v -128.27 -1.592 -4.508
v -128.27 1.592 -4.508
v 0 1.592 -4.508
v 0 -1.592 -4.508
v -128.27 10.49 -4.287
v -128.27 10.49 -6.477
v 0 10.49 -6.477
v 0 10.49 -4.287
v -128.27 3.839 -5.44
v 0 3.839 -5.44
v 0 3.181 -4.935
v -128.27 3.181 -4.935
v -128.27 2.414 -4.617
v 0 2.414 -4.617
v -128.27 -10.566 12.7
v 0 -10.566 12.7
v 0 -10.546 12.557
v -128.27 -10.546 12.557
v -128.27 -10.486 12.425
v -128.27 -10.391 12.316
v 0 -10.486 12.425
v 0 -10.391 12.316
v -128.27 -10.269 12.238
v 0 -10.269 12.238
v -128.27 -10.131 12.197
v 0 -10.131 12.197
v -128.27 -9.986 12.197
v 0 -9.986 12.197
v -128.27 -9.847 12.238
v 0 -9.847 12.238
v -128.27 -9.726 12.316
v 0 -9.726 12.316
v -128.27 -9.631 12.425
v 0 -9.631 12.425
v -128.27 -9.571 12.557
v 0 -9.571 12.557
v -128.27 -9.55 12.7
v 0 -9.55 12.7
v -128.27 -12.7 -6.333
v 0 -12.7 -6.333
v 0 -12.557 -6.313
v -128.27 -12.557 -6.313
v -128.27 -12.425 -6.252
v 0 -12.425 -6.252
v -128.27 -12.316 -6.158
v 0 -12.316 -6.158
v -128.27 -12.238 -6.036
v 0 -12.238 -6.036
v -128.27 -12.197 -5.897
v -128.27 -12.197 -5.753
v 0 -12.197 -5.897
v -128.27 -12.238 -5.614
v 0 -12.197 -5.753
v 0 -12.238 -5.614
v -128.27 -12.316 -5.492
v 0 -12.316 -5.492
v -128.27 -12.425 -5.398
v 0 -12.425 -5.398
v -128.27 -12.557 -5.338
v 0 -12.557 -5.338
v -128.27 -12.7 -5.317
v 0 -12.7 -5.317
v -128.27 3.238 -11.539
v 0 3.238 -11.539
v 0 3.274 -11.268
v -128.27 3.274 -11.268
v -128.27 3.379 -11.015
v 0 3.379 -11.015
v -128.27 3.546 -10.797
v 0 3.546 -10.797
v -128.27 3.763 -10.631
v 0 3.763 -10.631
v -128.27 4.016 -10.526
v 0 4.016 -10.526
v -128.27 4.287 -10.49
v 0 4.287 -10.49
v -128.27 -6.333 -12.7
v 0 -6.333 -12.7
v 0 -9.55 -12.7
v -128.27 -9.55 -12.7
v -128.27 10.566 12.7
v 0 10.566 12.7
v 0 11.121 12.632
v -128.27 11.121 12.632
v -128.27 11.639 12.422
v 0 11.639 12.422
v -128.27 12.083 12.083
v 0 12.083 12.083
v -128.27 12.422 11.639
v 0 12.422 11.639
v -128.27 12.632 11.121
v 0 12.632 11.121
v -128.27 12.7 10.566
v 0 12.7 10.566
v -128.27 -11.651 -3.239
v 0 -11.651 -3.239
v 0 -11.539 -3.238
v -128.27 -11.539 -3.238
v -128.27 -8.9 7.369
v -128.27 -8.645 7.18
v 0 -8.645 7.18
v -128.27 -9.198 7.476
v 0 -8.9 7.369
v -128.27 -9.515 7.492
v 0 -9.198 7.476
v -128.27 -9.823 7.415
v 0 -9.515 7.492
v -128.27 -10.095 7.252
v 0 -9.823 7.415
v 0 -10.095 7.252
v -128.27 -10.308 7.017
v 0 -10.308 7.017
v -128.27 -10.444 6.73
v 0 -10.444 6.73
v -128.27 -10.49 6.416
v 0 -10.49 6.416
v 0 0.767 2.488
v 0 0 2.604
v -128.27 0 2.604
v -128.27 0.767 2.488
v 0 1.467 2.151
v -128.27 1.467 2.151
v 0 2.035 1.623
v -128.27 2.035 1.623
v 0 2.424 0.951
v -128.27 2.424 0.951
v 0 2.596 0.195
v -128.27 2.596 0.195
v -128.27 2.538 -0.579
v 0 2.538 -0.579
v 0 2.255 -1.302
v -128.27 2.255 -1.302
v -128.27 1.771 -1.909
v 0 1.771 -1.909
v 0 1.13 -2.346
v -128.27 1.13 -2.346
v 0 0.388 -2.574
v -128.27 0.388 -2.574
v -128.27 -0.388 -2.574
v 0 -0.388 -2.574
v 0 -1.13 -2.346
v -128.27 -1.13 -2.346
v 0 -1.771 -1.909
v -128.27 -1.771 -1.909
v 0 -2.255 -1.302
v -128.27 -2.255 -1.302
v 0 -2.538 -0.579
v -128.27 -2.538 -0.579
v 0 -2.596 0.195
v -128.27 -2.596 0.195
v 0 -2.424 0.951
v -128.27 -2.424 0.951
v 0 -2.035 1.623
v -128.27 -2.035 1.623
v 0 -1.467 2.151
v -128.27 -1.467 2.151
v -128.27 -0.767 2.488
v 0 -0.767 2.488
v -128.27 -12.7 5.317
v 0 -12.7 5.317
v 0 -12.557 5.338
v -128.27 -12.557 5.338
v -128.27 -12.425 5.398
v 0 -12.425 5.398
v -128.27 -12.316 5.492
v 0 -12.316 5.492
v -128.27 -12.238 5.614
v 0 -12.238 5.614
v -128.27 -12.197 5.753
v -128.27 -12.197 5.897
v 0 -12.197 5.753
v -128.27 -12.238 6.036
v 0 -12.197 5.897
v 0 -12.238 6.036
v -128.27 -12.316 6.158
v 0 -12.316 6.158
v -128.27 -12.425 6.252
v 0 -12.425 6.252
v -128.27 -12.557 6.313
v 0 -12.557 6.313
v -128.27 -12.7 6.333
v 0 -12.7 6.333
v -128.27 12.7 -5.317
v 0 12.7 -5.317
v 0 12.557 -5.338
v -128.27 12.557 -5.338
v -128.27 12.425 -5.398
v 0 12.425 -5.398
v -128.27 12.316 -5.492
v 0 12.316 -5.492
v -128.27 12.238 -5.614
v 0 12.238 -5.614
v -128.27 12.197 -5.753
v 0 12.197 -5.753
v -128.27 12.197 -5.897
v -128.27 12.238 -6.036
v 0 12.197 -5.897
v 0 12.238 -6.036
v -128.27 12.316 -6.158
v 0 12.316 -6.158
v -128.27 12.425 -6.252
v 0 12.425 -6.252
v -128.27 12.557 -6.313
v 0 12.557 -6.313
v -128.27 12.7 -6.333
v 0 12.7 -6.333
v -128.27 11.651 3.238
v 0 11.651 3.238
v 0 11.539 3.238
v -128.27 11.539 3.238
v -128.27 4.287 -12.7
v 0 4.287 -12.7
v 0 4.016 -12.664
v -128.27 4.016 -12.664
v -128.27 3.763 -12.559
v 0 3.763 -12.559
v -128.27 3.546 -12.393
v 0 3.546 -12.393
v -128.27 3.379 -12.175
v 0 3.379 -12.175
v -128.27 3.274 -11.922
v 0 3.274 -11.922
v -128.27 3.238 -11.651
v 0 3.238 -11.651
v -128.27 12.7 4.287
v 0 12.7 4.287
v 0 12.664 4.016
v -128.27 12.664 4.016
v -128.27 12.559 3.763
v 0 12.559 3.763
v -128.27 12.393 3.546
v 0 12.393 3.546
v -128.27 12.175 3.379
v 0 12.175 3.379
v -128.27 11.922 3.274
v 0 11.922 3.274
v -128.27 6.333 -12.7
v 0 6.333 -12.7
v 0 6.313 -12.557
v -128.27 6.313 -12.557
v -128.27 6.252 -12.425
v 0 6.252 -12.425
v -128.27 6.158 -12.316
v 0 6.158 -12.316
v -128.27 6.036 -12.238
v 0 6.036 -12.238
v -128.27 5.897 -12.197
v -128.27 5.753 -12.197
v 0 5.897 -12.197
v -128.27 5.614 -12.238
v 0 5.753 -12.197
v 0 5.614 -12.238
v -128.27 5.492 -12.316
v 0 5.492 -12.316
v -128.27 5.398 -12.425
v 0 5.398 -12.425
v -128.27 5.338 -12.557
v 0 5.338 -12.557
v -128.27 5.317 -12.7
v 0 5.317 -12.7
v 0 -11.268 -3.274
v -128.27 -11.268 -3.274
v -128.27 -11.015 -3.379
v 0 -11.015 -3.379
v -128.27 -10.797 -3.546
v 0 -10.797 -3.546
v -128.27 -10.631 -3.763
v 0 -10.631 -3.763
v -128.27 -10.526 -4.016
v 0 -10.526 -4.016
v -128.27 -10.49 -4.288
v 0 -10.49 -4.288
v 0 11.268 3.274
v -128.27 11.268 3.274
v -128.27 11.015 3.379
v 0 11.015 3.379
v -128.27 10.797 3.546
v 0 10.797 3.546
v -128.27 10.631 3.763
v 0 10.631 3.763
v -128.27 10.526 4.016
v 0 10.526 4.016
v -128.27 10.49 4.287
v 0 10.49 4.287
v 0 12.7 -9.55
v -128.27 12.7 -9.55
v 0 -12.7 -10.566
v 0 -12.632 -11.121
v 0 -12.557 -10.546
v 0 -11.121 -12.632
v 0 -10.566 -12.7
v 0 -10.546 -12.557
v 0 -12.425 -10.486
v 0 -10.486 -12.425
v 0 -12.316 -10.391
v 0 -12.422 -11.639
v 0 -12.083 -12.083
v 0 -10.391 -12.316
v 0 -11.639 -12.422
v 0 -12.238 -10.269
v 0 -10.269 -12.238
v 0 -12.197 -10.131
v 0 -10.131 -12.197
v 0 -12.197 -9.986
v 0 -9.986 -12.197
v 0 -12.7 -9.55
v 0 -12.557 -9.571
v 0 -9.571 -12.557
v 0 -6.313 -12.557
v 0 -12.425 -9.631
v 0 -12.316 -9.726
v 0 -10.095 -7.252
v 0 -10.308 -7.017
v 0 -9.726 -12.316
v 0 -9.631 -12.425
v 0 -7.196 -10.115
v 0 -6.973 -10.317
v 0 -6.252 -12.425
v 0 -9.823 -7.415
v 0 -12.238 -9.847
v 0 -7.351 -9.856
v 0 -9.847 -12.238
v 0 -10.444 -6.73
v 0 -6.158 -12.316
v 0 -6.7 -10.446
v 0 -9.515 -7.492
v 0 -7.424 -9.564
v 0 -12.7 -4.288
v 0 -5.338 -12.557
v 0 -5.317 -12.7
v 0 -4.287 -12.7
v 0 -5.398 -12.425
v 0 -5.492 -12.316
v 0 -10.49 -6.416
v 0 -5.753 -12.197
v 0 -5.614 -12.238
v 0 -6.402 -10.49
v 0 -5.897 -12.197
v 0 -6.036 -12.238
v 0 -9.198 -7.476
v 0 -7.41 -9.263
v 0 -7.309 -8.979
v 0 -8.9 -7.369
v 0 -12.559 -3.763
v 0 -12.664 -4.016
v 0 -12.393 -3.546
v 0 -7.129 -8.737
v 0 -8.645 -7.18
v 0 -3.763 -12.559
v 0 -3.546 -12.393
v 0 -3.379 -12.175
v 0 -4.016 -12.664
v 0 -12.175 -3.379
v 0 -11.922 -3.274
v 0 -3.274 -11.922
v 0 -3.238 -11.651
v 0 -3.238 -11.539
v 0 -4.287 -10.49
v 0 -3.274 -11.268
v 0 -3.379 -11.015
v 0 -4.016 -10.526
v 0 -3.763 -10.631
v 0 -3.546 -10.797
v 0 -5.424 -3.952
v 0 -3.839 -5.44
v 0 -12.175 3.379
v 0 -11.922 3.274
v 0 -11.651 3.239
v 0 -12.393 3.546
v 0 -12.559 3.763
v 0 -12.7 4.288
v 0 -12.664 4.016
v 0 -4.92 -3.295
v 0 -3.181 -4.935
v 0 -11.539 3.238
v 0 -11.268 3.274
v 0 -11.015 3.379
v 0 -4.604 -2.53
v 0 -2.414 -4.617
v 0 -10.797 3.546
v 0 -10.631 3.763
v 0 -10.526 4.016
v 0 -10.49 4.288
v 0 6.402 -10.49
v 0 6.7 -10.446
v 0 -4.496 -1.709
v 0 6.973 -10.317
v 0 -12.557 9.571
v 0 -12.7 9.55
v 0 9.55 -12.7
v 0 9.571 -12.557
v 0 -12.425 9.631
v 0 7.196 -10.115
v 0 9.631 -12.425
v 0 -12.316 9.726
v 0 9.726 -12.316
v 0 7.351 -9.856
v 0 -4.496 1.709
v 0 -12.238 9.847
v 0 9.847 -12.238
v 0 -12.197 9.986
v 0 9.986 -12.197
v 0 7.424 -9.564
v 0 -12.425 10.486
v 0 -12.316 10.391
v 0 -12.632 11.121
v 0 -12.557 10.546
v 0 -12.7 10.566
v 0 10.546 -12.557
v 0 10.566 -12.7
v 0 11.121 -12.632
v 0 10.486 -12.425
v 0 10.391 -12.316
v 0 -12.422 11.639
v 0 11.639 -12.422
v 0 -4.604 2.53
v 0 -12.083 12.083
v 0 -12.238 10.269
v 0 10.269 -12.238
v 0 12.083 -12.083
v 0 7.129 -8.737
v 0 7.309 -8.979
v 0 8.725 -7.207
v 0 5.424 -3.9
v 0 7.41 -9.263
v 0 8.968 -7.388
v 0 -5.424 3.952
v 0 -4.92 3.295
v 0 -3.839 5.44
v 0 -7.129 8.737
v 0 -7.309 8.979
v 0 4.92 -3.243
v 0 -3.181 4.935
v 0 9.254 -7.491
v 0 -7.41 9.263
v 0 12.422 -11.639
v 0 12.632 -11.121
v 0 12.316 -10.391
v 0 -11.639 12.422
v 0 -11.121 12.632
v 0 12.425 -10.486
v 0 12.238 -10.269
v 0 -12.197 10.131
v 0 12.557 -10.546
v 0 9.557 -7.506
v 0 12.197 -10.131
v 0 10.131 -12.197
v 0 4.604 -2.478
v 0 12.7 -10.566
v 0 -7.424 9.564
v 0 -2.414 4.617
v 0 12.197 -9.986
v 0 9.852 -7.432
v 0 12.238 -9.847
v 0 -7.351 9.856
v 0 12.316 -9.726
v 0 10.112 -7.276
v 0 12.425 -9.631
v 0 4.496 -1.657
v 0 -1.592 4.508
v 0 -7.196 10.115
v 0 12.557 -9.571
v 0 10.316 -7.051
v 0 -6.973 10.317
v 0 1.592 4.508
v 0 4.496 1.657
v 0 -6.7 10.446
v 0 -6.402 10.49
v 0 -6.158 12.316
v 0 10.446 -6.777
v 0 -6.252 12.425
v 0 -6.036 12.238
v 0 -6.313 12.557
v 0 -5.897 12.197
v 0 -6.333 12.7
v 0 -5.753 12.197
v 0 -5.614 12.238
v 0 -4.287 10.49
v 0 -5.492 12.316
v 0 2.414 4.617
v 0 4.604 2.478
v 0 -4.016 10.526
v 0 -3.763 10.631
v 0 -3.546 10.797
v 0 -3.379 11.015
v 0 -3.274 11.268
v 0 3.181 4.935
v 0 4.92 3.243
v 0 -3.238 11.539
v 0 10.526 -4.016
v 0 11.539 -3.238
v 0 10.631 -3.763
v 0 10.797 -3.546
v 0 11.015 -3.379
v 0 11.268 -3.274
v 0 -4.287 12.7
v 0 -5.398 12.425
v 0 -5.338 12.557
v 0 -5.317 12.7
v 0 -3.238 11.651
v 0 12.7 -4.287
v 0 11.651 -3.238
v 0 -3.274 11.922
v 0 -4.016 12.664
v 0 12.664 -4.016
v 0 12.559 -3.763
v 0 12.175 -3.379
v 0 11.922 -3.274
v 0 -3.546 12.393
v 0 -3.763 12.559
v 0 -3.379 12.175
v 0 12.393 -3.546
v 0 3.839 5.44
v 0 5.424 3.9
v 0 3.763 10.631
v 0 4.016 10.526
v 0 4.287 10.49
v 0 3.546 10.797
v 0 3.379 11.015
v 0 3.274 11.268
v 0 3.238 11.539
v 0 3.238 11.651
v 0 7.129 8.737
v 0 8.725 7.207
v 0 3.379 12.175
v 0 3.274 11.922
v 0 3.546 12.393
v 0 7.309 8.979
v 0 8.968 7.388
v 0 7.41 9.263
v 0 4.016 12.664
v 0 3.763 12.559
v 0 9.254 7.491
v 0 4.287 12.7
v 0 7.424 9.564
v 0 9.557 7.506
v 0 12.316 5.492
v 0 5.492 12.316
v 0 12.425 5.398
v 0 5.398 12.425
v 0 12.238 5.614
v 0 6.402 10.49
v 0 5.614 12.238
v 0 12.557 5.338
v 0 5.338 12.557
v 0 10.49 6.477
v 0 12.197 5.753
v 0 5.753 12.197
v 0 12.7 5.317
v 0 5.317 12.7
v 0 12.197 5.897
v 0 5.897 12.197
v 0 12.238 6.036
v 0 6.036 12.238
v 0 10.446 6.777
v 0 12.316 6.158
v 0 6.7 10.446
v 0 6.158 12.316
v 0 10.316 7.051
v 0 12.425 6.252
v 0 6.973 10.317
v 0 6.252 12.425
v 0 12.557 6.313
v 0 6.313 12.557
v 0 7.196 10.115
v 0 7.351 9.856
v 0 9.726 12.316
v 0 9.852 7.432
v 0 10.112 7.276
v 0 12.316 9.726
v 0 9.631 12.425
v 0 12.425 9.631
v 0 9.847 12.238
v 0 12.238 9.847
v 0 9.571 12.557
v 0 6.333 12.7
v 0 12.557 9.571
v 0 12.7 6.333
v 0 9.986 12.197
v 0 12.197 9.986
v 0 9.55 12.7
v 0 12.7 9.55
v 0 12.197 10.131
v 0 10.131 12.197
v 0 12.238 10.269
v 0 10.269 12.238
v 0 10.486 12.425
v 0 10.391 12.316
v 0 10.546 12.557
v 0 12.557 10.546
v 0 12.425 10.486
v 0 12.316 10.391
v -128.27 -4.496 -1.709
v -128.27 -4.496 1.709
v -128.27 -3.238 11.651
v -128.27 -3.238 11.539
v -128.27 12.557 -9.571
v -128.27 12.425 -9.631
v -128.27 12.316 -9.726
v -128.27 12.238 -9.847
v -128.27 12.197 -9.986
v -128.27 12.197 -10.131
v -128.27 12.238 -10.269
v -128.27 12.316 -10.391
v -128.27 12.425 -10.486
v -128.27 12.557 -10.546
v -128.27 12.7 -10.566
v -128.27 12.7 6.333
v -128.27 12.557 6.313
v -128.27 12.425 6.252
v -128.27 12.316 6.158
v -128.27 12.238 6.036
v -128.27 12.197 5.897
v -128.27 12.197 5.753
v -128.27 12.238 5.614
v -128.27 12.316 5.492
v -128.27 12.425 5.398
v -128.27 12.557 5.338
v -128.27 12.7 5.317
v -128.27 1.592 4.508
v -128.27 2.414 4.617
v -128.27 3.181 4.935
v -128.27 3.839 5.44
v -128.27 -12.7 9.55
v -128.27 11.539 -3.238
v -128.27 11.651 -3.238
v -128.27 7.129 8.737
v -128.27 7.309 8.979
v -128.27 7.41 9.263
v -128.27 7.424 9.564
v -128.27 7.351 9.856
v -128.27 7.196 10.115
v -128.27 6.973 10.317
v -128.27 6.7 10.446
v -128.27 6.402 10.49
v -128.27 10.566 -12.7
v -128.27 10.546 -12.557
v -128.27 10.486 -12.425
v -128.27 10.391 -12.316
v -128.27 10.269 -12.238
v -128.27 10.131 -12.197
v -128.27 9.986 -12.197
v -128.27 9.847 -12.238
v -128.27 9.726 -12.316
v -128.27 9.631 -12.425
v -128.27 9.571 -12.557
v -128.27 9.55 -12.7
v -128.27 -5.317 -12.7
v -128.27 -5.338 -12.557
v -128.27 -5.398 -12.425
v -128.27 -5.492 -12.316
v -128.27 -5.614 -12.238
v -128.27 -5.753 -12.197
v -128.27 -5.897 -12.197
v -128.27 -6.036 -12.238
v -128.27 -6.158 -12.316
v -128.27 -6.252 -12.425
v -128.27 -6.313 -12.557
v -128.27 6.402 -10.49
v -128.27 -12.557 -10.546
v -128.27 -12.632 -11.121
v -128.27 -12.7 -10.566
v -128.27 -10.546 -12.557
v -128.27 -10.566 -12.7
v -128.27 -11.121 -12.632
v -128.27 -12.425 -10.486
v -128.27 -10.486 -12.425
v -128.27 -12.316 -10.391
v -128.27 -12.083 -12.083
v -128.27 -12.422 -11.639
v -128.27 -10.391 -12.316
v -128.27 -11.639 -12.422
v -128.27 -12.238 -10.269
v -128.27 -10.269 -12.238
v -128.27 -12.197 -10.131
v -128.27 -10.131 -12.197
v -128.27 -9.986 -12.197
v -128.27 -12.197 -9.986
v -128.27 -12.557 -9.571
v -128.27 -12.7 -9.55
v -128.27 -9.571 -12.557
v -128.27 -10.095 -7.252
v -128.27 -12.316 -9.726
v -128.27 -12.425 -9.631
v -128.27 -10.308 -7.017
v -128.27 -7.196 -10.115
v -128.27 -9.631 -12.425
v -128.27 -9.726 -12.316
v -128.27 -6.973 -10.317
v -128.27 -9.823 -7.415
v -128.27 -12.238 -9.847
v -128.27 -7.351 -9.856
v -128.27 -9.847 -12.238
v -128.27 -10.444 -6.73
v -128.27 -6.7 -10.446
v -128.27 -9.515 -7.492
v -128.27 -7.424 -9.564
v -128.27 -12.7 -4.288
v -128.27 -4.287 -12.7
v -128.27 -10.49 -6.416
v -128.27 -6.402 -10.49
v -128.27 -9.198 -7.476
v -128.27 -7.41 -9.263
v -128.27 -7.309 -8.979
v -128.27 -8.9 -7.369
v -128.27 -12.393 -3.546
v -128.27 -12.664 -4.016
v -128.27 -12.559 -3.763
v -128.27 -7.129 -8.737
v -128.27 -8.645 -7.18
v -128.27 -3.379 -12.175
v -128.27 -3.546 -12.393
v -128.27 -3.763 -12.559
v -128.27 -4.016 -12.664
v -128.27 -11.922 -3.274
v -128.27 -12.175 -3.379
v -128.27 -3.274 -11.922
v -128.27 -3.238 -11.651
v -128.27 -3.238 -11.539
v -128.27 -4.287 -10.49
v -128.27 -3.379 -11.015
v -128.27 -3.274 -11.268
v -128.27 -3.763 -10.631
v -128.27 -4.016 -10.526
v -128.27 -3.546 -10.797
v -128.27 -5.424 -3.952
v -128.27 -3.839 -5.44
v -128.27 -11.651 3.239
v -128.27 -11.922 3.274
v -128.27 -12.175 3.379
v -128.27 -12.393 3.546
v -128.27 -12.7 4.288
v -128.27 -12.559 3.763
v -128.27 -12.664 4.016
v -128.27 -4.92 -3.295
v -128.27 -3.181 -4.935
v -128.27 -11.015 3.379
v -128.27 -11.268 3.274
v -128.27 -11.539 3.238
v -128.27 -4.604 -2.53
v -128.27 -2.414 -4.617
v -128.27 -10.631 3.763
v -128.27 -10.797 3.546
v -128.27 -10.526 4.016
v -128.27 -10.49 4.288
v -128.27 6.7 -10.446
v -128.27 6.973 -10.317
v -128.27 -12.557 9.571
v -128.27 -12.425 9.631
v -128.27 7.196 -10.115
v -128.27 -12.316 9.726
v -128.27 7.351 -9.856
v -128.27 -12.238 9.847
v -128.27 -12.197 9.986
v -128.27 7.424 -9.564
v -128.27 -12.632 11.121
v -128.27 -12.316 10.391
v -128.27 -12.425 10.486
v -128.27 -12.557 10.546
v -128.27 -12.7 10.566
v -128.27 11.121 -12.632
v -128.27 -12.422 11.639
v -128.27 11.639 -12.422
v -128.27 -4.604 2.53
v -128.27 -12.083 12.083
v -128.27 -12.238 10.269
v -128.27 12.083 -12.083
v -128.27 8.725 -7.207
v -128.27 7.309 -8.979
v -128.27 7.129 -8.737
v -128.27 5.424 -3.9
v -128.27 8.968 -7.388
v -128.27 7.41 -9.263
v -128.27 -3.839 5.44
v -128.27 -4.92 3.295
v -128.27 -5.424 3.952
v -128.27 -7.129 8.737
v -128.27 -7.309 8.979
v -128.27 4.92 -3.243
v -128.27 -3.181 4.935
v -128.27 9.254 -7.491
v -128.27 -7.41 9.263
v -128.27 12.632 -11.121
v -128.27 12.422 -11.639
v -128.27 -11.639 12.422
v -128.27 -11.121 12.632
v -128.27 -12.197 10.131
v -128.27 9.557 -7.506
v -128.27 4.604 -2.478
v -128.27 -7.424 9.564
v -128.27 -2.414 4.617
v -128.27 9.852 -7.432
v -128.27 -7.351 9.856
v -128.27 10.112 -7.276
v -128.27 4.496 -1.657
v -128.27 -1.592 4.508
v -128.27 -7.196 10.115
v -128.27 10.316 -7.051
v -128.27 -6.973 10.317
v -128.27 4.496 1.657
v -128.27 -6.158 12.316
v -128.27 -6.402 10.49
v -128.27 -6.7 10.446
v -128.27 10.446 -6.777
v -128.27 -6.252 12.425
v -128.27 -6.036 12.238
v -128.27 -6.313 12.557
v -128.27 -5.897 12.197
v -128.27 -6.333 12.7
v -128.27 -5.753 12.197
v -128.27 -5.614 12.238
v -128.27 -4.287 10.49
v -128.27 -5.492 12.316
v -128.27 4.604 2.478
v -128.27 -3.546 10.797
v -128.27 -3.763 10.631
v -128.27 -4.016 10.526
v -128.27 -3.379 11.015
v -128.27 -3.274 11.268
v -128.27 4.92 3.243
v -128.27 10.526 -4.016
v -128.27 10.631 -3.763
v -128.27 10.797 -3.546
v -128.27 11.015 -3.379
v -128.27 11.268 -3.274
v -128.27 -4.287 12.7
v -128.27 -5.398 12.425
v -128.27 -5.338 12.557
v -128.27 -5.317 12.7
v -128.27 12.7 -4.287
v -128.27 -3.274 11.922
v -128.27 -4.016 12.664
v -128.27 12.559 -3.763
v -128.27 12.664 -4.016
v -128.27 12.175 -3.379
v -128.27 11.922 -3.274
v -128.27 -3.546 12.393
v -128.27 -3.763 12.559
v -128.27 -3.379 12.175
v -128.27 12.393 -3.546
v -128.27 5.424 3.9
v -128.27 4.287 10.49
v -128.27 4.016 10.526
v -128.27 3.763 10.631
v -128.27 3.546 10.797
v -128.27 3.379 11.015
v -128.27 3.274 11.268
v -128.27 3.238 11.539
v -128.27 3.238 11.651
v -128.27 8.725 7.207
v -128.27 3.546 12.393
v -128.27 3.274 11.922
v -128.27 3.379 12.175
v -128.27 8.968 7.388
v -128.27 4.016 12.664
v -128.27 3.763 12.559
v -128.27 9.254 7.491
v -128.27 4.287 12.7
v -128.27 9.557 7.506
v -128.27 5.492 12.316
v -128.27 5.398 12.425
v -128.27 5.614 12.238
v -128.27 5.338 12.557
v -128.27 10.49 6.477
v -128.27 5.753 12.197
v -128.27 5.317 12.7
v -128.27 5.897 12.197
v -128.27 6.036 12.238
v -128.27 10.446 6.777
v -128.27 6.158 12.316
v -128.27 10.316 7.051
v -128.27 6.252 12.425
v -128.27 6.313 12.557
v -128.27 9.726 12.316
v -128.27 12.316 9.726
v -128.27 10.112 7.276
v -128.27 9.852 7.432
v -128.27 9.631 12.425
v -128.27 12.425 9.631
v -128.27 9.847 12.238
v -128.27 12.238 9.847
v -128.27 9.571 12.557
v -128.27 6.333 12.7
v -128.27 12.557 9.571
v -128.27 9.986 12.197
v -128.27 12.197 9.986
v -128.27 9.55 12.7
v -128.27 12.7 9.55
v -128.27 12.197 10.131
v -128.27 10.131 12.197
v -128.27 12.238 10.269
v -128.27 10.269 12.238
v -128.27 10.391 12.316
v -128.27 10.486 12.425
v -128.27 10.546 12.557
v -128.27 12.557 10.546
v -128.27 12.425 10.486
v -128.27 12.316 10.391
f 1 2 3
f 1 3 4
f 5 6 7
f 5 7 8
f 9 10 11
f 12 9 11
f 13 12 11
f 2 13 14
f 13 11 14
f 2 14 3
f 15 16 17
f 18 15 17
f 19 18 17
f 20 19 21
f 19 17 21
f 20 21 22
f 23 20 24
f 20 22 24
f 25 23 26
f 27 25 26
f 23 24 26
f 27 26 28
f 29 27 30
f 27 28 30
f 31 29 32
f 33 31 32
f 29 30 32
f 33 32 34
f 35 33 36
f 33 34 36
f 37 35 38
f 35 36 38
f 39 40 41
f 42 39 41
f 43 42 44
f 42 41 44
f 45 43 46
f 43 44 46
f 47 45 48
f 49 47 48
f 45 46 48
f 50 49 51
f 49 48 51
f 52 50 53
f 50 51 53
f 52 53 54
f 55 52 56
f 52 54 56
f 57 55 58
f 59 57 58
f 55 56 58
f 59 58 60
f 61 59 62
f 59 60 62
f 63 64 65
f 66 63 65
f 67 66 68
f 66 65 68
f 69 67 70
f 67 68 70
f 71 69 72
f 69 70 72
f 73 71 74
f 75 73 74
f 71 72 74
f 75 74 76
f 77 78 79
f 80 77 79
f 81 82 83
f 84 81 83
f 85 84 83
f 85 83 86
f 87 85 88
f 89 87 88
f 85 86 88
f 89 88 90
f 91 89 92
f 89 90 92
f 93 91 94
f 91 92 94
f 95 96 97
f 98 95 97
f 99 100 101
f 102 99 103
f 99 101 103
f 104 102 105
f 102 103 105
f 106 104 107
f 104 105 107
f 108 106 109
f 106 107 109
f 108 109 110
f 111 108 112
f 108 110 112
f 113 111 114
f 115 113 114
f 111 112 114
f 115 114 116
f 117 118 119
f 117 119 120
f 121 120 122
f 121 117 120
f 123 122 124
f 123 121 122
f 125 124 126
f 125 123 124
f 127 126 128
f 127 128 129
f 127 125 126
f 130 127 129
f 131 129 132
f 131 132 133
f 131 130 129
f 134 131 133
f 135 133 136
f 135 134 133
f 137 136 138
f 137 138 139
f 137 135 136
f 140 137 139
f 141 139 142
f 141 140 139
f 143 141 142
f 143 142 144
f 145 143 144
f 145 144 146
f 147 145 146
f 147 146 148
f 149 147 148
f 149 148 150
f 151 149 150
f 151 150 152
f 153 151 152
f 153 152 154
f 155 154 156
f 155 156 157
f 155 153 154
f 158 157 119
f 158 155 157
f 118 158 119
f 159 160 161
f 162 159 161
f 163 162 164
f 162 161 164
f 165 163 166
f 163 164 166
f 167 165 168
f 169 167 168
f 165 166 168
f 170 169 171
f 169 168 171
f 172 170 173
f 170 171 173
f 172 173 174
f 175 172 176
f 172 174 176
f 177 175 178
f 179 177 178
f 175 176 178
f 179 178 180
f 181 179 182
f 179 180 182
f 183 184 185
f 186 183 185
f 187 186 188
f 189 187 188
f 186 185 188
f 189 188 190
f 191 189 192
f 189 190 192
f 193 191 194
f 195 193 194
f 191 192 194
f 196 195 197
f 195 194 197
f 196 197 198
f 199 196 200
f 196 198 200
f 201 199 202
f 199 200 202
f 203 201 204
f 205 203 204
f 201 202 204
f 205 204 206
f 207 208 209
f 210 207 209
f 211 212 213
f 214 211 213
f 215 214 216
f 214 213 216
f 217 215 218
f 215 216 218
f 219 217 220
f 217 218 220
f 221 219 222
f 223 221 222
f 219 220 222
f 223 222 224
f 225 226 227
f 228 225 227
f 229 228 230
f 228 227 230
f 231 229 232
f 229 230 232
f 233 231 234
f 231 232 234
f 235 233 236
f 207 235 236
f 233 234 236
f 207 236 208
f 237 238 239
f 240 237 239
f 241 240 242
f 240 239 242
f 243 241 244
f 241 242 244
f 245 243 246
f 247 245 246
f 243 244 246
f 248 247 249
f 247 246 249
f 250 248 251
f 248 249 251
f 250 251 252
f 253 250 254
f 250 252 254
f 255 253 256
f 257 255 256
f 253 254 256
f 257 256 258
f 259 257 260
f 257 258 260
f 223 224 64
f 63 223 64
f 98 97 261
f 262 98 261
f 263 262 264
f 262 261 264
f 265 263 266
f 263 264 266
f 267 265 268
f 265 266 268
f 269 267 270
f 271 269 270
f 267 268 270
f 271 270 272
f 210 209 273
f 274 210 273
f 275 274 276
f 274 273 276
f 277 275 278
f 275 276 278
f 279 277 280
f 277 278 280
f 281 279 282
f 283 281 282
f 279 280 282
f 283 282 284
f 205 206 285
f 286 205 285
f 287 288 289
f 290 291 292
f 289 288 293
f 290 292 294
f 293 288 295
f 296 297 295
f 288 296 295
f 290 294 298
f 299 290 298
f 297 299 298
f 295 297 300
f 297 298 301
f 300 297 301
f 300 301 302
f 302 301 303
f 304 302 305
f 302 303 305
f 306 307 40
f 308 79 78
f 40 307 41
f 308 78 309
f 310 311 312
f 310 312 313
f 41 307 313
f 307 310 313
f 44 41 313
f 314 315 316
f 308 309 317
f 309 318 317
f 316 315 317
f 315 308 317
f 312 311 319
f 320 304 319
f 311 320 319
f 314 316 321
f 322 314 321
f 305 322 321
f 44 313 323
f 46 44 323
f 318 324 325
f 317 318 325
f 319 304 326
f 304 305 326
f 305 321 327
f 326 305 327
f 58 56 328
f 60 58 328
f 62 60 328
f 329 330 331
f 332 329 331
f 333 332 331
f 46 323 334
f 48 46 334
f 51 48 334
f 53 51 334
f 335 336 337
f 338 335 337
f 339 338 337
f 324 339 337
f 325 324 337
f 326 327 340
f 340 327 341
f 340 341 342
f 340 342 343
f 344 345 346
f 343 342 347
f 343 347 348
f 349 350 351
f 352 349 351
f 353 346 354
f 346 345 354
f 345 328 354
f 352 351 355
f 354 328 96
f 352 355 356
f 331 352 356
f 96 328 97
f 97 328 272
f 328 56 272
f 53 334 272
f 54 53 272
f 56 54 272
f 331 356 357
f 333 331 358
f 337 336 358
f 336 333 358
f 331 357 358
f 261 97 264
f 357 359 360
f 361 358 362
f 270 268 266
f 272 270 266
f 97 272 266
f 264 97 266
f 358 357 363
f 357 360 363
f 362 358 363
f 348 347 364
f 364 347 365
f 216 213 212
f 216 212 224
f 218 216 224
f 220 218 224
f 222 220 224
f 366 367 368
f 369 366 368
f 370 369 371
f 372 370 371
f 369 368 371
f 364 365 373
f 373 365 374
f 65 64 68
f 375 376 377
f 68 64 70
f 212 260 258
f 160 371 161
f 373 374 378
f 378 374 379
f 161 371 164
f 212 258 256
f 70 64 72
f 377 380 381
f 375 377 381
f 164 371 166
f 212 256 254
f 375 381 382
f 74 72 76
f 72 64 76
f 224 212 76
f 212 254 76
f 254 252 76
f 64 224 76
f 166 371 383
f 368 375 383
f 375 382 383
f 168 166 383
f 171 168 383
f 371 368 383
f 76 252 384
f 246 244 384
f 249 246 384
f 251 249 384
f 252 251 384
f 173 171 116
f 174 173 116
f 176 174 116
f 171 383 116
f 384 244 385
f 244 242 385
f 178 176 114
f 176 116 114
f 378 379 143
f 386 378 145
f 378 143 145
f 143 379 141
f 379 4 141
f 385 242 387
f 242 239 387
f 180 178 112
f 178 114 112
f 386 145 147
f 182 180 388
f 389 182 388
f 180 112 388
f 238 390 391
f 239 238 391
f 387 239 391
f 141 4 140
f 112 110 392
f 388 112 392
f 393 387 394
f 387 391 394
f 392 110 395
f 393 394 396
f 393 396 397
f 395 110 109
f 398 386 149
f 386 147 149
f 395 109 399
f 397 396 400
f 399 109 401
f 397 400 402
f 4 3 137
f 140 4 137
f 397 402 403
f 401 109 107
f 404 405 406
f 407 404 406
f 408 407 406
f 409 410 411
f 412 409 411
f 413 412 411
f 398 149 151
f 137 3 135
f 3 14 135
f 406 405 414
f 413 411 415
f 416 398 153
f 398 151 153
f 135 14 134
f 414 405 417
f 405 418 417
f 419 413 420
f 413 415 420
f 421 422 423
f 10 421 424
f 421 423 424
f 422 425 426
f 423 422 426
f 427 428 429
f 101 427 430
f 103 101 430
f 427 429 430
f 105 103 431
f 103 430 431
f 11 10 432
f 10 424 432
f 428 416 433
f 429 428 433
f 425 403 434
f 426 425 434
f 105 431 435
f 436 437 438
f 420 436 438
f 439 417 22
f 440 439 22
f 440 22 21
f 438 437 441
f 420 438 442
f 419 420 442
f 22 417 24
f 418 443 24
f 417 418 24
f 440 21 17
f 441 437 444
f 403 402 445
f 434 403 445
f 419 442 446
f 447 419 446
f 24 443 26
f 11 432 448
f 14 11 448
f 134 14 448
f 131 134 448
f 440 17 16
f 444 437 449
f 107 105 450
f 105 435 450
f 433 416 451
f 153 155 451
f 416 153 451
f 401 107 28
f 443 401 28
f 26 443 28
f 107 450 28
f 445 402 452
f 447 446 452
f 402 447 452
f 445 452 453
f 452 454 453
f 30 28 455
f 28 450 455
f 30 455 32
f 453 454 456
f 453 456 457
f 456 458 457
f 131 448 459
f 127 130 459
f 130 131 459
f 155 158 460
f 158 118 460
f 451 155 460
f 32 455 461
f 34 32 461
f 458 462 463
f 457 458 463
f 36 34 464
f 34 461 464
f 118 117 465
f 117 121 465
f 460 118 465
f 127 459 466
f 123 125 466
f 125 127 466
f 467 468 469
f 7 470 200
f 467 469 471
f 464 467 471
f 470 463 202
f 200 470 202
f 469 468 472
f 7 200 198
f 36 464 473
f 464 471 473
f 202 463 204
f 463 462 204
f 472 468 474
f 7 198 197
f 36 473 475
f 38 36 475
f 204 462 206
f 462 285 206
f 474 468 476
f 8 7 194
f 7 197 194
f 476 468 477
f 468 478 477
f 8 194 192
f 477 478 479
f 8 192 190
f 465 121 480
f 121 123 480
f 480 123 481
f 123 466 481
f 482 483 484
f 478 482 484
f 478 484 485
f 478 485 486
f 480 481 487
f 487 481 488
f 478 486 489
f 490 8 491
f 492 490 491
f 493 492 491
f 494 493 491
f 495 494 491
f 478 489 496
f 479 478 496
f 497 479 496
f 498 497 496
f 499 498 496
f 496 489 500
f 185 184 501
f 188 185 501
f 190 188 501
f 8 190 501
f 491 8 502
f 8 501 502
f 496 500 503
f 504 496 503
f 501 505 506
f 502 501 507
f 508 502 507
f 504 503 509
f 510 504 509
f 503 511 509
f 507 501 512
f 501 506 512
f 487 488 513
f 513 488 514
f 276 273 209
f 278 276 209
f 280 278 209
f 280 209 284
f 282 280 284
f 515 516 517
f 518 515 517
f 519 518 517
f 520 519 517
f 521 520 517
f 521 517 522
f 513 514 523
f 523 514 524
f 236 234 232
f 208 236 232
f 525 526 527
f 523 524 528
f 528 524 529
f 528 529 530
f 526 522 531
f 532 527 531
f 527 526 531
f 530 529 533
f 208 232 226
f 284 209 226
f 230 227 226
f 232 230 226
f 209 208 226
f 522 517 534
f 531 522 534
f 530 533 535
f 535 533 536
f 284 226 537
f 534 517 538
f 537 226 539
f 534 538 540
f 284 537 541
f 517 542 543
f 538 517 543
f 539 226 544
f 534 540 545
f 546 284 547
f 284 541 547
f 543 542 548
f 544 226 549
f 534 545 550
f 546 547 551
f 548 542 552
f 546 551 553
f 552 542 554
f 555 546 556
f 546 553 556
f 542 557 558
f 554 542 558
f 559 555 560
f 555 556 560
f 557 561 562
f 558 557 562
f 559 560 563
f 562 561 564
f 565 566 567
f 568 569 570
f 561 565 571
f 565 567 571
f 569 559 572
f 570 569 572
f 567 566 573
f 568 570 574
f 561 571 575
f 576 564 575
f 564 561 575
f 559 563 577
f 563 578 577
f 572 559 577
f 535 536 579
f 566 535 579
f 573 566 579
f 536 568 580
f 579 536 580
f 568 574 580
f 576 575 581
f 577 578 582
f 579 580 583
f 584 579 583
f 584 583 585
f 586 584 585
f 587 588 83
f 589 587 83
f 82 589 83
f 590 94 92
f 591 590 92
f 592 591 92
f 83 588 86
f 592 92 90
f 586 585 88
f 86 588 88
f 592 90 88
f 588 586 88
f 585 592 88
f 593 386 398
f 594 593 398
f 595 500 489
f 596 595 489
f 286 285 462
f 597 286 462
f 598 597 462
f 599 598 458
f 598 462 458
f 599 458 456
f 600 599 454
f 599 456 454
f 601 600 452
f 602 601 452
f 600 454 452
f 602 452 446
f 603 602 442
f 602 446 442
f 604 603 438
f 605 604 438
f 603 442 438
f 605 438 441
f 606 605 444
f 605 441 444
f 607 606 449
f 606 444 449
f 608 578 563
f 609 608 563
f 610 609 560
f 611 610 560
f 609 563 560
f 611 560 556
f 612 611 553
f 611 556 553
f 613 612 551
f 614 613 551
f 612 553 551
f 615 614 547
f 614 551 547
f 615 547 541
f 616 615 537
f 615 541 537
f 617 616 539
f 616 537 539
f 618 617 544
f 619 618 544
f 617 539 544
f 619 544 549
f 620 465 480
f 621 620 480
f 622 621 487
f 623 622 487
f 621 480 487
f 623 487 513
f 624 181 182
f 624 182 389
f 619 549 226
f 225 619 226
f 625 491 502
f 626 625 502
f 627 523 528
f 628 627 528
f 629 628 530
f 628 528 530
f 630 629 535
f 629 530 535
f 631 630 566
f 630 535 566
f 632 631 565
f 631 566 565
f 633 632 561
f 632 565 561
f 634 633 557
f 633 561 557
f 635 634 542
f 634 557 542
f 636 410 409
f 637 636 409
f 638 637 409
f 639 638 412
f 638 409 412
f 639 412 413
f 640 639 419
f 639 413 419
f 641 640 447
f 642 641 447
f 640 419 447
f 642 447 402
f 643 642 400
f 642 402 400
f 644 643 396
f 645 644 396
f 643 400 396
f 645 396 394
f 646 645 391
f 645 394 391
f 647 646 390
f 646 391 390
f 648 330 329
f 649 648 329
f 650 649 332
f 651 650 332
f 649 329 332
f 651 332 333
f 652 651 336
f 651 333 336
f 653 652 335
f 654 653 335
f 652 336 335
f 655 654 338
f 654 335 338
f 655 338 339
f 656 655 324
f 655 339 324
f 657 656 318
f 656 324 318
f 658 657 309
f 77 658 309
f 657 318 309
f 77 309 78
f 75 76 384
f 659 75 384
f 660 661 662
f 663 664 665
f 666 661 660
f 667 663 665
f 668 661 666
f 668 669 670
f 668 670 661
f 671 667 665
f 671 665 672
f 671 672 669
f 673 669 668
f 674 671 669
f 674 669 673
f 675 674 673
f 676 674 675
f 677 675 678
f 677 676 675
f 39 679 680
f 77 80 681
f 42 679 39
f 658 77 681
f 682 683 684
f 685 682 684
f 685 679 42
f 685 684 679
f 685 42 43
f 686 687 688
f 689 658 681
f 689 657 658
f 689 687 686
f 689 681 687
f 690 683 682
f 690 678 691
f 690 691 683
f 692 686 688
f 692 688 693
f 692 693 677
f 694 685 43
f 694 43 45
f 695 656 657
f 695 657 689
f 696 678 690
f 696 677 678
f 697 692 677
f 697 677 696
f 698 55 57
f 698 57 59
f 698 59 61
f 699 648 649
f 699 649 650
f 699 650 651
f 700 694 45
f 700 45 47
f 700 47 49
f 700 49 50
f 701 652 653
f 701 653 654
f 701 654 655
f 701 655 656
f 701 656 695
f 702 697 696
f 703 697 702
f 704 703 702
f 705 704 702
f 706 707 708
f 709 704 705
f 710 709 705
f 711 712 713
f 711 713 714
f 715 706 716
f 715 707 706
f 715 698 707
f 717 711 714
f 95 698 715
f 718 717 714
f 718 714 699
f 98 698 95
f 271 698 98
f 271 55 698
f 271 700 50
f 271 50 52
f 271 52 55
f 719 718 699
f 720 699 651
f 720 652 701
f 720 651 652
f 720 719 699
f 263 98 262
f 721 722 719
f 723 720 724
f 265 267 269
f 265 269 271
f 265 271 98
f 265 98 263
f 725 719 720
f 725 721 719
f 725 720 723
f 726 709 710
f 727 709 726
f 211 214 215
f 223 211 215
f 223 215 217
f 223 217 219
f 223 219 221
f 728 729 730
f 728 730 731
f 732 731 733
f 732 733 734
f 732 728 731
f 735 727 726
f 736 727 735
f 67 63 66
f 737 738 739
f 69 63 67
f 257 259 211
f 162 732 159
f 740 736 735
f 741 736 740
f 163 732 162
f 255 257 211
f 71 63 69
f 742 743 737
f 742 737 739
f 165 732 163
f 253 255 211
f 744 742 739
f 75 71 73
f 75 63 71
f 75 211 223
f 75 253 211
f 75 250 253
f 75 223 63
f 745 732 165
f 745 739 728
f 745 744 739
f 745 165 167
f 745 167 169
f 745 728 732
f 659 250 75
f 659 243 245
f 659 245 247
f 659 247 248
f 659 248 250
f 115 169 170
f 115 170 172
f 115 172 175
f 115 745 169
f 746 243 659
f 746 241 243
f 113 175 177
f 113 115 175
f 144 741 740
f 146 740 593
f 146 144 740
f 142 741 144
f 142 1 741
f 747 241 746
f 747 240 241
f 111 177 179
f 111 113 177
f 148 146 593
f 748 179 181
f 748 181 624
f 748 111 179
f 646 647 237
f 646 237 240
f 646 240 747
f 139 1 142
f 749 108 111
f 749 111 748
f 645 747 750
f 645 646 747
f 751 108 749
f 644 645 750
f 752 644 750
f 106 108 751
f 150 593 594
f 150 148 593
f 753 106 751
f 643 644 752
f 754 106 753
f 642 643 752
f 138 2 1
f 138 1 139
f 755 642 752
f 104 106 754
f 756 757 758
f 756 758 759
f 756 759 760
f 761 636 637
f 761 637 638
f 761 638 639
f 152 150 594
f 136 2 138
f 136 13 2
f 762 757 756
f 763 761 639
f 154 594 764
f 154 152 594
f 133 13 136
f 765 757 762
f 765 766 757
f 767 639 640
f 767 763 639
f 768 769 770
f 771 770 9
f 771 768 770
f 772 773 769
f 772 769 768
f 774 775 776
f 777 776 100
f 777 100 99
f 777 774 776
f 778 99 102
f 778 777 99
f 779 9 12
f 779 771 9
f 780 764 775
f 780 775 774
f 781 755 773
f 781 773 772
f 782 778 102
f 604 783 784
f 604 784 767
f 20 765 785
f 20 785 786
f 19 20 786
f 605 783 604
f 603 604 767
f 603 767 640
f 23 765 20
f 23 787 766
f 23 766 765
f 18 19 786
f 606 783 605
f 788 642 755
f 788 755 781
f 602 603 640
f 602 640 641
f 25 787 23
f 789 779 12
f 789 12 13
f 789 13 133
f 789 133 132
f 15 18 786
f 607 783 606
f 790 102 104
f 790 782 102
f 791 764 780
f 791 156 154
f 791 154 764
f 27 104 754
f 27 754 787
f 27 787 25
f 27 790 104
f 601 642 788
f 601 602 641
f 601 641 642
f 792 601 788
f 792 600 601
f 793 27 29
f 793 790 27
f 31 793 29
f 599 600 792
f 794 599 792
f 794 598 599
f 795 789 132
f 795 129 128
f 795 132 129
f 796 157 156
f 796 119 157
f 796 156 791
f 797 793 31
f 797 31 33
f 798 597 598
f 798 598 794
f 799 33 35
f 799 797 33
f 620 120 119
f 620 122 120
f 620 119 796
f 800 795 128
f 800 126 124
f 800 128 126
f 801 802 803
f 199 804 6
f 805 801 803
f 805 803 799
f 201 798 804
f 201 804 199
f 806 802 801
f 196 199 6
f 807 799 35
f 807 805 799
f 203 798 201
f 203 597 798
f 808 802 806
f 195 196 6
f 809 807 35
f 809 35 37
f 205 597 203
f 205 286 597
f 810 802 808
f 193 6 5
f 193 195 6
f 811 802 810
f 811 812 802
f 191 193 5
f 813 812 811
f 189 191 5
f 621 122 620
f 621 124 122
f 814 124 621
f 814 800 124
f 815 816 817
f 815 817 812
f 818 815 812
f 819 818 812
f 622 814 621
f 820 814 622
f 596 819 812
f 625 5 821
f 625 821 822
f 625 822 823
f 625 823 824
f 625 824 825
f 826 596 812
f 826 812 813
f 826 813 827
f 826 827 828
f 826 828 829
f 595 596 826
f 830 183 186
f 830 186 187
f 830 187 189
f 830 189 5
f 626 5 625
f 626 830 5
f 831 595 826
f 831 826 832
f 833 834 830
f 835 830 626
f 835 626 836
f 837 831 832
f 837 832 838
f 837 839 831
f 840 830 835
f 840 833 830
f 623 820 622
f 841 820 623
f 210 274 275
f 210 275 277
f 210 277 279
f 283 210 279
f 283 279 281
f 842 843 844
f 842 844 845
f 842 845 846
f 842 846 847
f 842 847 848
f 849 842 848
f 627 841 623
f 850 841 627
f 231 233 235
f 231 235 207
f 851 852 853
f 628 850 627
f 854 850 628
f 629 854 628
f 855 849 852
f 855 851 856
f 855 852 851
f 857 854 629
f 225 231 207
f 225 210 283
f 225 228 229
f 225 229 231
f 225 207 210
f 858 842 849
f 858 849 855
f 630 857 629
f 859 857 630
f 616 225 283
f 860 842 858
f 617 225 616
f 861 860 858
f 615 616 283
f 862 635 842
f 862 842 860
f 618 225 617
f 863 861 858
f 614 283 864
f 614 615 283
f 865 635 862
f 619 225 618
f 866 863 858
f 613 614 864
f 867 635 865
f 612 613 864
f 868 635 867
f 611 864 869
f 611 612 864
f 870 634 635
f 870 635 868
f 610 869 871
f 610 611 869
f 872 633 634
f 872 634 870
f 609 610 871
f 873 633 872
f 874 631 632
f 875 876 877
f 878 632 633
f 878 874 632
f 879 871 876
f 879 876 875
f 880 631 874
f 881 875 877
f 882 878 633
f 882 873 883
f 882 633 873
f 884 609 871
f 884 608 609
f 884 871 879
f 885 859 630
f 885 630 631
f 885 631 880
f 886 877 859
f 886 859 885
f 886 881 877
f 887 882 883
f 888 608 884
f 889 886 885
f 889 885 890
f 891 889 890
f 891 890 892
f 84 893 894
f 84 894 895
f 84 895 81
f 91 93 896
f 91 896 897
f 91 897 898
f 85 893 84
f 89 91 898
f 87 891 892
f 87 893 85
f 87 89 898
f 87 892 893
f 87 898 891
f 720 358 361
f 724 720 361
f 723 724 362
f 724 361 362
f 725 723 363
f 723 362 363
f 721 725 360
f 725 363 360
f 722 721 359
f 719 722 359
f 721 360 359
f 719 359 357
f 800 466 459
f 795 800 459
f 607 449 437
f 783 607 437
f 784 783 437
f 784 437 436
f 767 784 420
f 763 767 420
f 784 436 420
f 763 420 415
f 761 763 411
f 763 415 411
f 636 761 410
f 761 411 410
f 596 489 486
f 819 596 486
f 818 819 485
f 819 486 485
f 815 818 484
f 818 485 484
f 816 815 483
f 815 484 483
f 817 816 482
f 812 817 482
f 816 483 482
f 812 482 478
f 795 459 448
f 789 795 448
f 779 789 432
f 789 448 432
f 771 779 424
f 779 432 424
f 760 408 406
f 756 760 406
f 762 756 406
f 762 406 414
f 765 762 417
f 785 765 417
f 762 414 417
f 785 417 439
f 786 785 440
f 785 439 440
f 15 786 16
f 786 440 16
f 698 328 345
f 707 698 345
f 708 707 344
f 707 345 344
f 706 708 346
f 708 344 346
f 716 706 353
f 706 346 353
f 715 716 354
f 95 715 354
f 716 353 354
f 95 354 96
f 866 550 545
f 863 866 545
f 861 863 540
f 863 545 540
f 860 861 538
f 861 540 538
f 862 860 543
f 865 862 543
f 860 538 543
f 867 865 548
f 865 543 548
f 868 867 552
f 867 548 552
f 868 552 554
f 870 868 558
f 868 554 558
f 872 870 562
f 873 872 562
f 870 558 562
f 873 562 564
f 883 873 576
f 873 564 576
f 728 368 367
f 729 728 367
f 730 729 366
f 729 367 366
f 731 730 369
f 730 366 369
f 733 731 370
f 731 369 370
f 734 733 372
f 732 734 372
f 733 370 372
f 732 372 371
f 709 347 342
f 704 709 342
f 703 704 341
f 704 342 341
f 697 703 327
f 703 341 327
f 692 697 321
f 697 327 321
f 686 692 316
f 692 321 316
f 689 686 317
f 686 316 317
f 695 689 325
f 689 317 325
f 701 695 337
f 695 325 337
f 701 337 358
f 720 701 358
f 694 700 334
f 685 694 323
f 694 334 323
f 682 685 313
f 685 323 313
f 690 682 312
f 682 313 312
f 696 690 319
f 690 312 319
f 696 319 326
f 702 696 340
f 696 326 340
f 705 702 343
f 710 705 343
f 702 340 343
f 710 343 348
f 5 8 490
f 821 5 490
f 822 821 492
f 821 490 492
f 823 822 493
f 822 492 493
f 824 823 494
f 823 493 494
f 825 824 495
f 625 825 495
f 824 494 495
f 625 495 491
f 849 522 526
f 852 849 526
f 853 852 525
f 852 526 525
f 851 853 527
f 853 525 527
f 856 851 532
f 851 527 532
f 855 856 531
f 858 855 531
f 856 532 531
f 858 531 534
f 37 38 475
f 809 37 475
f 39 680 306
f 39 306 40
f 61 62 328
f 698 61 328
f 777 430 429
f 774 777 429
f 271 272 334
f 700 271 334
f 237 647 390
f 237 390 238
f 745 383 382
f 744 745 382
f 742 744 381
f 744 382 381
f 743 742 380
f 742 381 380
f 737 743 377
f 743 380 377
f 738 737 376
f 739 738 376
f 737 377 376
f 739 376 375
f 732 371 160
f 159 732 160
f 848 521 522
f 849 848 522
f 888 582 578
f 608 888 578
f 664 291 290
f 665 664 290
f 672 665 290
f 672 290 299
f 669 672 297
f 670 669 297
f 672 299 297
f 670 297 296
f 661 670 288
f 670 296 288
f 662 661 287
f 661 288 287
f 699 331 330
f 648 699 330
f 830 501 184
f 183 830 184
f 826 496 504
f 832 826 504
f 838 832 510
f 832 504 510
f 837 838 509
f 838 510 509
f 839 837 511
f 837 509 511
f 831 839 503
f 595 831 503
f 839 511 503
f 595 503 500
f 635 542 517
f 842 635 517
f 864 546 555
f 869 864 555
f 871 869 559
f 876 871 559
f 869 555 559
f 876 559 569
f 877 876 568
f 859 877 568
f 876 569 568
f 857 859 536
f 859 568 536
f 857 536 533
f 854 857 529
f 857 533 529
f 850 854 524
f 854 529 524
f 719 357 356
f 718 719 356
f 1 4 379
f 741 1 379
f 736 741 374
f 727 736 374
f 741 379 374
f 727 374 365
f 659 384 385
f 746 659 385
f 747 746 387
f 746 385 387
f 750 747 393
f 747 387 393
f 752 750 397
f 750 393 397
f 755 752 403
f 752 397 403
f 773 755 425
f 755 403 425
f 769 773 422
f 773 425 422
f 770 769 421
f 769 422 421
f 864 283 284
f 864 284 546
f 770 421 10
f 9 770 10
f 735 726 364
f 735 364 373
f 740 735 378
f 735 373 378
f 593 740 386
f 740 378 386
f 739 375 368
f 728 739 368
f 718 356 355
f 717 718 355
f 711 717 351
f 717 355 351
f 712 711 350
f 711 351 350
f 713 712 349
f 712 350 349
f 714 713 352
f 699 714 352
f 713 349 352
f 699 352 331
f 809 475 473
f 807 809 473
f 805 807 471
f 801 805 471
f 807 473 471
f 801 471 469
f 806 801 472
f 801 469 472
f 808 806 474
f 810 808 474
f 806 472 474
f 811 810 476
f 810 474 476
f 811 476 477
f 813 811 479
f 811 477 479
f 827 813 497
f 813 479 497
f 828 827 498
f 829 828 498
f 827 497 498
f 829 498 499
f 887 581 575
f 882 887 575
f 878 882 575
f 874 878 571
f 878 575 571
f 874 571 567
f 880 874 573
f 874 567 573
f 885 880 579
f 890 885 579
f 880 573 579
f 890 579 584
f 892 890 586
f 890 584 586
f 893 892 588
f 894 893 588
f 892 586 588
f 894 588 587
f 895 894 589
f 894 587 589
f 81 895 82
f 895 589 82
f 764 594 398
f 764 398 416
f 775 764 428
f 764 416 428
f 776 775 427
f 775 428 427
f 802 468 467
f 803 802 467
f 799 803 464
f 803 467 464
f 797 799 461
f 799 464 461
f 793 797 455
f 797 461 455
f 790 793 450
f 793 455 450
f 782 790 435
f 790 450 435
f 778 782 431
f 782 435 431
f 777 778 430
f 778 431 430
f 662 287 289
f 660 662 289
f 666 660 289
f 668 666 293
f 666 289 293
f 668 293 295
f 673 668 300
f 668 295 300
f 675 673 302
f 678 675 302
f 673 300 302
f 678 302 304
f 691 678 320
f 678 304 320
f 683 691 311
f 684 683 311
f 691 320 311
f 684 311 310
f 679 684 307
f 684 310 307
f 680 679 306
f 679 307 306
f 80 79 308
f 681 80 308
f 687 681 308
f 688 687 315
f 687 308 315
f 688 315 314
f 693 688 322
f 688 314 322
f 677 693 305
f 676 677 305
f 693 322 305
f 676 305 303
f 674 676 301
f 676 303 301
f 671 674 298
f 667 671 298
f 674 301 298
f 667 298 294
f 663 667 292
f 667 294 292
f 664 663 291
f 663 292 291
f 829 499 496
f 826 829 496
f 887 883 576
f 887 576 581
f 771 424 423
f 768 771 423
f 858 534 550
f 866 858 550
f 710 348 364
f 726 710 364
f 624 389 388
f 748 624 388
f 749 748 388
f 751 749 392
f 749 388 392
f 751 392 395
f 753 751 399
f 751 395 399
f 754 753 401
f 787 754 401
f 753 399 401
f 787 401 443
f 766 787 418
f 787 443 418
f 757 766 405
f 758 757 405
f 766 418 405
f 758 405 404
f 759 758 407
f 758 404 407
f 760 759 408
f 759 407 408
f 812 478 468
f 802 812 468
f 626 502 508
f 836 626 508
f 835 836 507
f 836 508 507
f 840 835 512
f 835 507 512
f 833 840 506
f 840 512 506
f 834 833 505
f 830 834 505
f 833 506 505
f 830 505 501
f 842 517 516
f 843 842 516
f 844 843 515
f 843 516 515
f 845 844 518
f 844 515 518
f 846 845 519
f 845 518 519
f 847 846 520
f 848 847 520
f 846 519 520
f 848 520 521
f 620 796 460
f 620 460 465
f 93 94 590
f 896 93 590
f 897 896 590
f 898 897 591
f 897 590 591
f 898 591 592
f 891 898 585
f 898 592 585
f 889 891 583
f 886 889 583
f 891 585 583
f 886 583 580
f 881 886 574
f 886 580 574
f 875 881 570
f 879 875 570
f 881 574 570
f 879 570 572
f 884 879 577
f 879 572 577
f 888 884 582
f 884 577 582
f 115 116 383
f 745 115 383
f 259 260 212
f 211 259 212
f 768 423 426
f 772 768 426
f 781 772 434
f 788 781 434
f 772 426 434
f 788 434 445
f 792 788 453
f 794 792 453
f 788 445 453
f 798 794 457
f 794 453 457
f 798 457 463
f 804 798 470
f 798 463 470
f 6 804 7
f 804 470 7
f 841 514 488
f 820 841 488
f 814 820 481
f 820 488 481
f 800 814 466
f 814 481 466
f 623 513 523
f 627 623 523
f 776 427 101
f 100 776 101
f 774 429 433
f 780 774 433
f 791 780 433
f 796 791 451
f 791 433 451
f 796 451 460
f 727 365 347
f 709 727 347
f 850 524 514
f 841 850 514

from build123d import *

# Parameters (mm, degrees)
SKETCH11_R                = 2.6035
F_10_1010_PROFILE_1_DEPTH = 128.27


with BuildPart() as part:
    # Sketch11 → 10 1010 PROFILE(1) (new body)
    with BuildSketch(Plane.ZY):
        with BuildLine():
            Line((-1.709253557, -4.4958), (1.709253557, -4.4958))
            ThreePointArc((1.709253557, -4.4958), (2.922935876, -4.736928798), (3.95226937, -5.423689619))
            Line((3.95226937, -5.423689619), (7.179652728, -8.645192207))
            ThreePointArc((7.179652728, -8.645192207), (7.414733441, -9.822812921), (6.41641086, -10.4902))
            Line((6.41641086, -10.4902), (4.28752, -10.4902))
            ThreePointArc((4.28752, -10.4902), (3.545750844, -10.797450844), (3.2385, -11.53922))
            Line((3.2385, -11.53922), (3.2385, -11.65098))
            ThreePointArc((3.2385, -11.65098), (3.545750844, -12.392749156), (4.28752, -12.7))
            Line((4.28752, -12.7), (5.3171344, -12.7))
            ThreePointArc((5.3171344, -12.7), (5.8251344, -12.192), (6.3331344, -12.7))
            Line((6.3331344, -12.7), (9.5504, -12.7))
            ThreePointArc((9.5504, -12.7), (10.058323491, -12.192000006), (10.566399977, -12.699846982))
            ThreePointArc((10.566399977, -12.699846982), (12.082522516, -12.082522516), (12.699846982, -10.566399977))
            ThreePointArc((12.699846982, -10.566399977), (12.192000006, -10.058323491), (12.7, -9.5504))
            Line((12.7, -9.5504), (12.7, -6.3330836))
            ThreePointArc((12.7, -6.3330836), (12.192, -5.8250836), (12.7, -5.3170836))
            Line((12.7, -5.3170836), (12.7, -4.287470133))
            ThreePointArc((12.7, -4.287470133), (12.392749156, -3.545700977), (11.65098, -3.238450133))
            Line((11.65098, -3.238450133), (11.53922, -3.238450133))
            ThreePointArc((11.53922, -3.238450133), (10.797450844, -3.545700977), (10.4902, -4.287470133))
            Line((10.4902, -4.287470133), (10.4902, -6.402089023))
            ThreePointArc((10.4902, -6.402089023), (9.856394933, -7.351113629), (8.736962546, -7.129240479))
            Line((8.736962546, -7.129240479), (5.440484187, -3.838768792))
            ThreePointArc((5.440484187, -3.838768792), (4.75073678, -2.808015636), (4.5085, -1.591658411))
            Line((4.5085, -1.591658411), (4.5085, 1.591658411))
            ThreePointArc((4.5085, 1.591658411), (4.75073678, 2.808015636), (5.440484187, 3.838768792))
            Line((5.440484187, 3.838768792), (8.736962546, 7.129240479))
            ThreePointArc((8.736962546, 7.129240479), (9.856394933, 7.351113629), (10.4902, 6.402089023))
            Line((10.4902, 6.402089023), (10.4902, 4.287470133))
            ThreePointArc((10.4902, 4.287470133), (10.797450844, 3.545700977), (11.53922, 3.238450133))
            Line((11.53922, 3.238450133), (11.65098, 3.238450133))
            ThreePointArc((11.65098, 3.238450133), (12.392749156, 3.545700977), (12.7, 4.287470133))
            Line((12.7, 4.287470133), (12.7, 5.3171344))
            ThreePointArc((12.7, 5.3171344), (12.192, 5.8251344), (12.7, 6.3331344))
            Line((12.7, 6.3331344), (12.7, 9.5504))
            ThreePointArc((12.7, 9.5504), (12.192000006, 10.058323491), (12.699846982, 10.566399977))
            ThreePointArc((12.699846982, 10.566399977), (12.082522516, 12.082522516), (10.566399977, 12.699846982))
            ThreePointArc((10.566399977, 12.699846982), (10.058323491, 12.192000006), (9.5504, 12.7))
            Line((9.5504, 12.7), (6.3330836, 12.7))
            ThreePointArc((6.3330836, 12.7), (5.8250836, 12.192), (5.3170836, 12.7))
            Line((5.3170836, 12.7), (4.2874692, 12.7))
            ThreePointArc((4.2874692, 12.7), (3.545700044, 12.392749156), (3.2384492, 11.65098))
            Line((3.2384492, 11.65098), (3.2384492, 11.53922))
            ThreePointArc((3.2384492, 11.53922), (3.545700044, 10.797450844), (4.2874692, 10.4902))
            Line((4.2874692, 10.4902), (6.476774195, 10.4902))
            ThreePointArc((6.476774195, 10.4902), (7.43216212, 9.851515102), (7.207191475, 8.724540082))
            Line((7.207191475, 8.724540082), (3.900315394, 5.423689619))
            ThreePointArc((3.900315394, 5.423689619), (2.8709819, 4.736928798), (1.657299581, 4.4958))
            Line((1.657299581, 4.4958), (-1.657299581, 4.4958))
            ThreePointArc((-1.657299581, 4.4958), (-2.8709819, 4.736928798), (-3.900315394, 5.423689619))
            Line((-3.900315394, 5.423689619), (-7.207191475, 8.724540082))
            ThreePointArc((-7.207191475, 8.724540082), (-7.43216212, 9.851515102), (-6.476774195, 10.4902))
            Line((-6.476774195, 10.4902), (-4.2874692, 10.4902))
            ThreePointArc((-4.2874692, 10.4902), (-3.545700044, 10.797450844), (-3.2384492, 11.53922))
            Line((-3.2384492, 11.53922), (-3.2384492, 11.65098))
            ThreePointArc((-3.2384492, 11.65098), (-3.545700044, 12.392749156), (-4.2874692, 12.7))
            Line((-4.2874692, 12.7), (-5.3170836, 12.7))
            ThreePointArc((-5.3170836, 12.7), (-5.8250836, 12.192), (-6.3330836, 12.7))
            Line((-6.3330836, 12.7), (-9.5504, 12.7))
            ThreePointArc((-9.5504, 12.7), (-10.058323491, 12.192000006), (-10.566399977, 12.699846982))
            ThreePointArc((-10.566399977, 12.699846982), (-12.082522516, 12.082522516), (-12.699846982, 10.566399977))
            ThreePointArc((-12.699846982, 10.566399977), (-12.192000006, 10.058323491), (-12.7, 9.5504))
            Line((-12.7, 9.5504), (-12.7, 6.3331344))
            ThreePointArc((-12.7, 6.3331344), (-12.192, 5.8251344), (-12.7, 5.3171344))
            Line((-12.7, 5.3171344), (-12.7, 4.287470133))
            ThreePointArc((-12.7, 4.287470133), (-12.392749156, 3.545700977), (-11.65098, 3.238450133))
            Line((-11.65098, 3.238450133), (-11.53922, 3.238450133))
            ThreePointArc((-11.53922, 3.238450133), (-10.797450844, 3.545700977), (-10.4902, 4.287470133))
            Line((-10.4902, 4.287470133), (-10.4902, 6.402089023))
            ThreePointArc((-10.4902, 6.402089023), (-9.856394933, 7.351113629), (-8.736962546, 7.129240479))
            Line((-8.736962546, 7.129240479), (-5.440484187, 3.838768792))
            ThreePointArc((-5.440484187, 3.838768792), (-4.75073678, 2.808015636), (-4.5085, 1.591658411))
            Line((-4.5085, 1.591658411), (-4.5085, -1.591658411))
            ThreePointArc((-4.5085, -1.591658411), (-4.75073678, -2.808015636), (-5.440484187, -3.838768792))
            Line((-5.440484187, -3.838768792), (-8.736962546, -7.129240479))
            ThreePointArc((-8.736962546, -7.129240479), (-9.856394933, -7.351113629), (-10.4902, -6.402089023))
            Line((-10.4902, -6.402089023), (-10.4902, -4.287470133))
            ThreePointArc((-10.4902, -4.287470133), (-10.797450844, -3.545700977), (-11.53922, -3.238450133))
            Line((-11.53922, -3.238450133), (-11.65098, -3.238450133))
            ThreePointArc((-11.65098, -3.238450133), (-12.392749156, -3.545700977), (-12.7, -4.287470133))
            Line((-12.7, -4.287470133), (-12.7, -5.3170836))
            ThreePointArc((-12.7, -5.3170836), (-12.192, -5.8250836), (-12.7, -6.3330836))
            Line((-12.7, -6.3330836), (-12.7, -9.5504))
            ThreePointArc((-12.7, -9.5504), (-12.192000006, -10.058323491), (-12.699846982, -10.566399977))
            ThreePointArc((-12.699846982, -10.566399977), (-12.082522516, -12.082522516), (-10.566399977, -12.699846982))
            ThreePointArc((-10.566399977, -12.699846982), (-10.058323491, -12.192000006), (-9.5504, -12.7))
            Line((-9.5504, -12.7), (-6.3331344, -12.7))
            ThreePointArc((-6.3331344, -12.7), (-5.8251344, -12.192), (-5.3171344, -12.7))
            Line((-5.3171344, -12.7), (-4.28752, -12.7))
            ThreePointArc((-4.28752, -12.7), (-3.545750844, -12.392749156), (-3.2385, -11.65098))
            Line((-3.2385, -11.65098), (-3.2385, -11.53922))
            ThreePointArc((-3.2385, -11.53922), (-3.545750844, -10.797450844), (-4.28752, -10.4902))
            Line((-4.28752, -10.4902), (-6.41641086, -10.4902))
            ThreePointArc((-6.41641086, -10.4902), (-7.414733441, -9.822812921), (-7.179652728, -8.645192207))
            Line((-7.179652728, -8.645192207), (-3.95226937, -5.423689619))
            ThreePointArc((-3.95226937, -5.423689619), (-2.922935876, -4.736928798), (-1.709253557, -4.4958))
        make_face()
        Circle(SKETCH11_R, mode=Mode.SUBTRACT)
    extrude(amount=F_10_1010_PROFILE_1_DEPTH)


solid = part.part
